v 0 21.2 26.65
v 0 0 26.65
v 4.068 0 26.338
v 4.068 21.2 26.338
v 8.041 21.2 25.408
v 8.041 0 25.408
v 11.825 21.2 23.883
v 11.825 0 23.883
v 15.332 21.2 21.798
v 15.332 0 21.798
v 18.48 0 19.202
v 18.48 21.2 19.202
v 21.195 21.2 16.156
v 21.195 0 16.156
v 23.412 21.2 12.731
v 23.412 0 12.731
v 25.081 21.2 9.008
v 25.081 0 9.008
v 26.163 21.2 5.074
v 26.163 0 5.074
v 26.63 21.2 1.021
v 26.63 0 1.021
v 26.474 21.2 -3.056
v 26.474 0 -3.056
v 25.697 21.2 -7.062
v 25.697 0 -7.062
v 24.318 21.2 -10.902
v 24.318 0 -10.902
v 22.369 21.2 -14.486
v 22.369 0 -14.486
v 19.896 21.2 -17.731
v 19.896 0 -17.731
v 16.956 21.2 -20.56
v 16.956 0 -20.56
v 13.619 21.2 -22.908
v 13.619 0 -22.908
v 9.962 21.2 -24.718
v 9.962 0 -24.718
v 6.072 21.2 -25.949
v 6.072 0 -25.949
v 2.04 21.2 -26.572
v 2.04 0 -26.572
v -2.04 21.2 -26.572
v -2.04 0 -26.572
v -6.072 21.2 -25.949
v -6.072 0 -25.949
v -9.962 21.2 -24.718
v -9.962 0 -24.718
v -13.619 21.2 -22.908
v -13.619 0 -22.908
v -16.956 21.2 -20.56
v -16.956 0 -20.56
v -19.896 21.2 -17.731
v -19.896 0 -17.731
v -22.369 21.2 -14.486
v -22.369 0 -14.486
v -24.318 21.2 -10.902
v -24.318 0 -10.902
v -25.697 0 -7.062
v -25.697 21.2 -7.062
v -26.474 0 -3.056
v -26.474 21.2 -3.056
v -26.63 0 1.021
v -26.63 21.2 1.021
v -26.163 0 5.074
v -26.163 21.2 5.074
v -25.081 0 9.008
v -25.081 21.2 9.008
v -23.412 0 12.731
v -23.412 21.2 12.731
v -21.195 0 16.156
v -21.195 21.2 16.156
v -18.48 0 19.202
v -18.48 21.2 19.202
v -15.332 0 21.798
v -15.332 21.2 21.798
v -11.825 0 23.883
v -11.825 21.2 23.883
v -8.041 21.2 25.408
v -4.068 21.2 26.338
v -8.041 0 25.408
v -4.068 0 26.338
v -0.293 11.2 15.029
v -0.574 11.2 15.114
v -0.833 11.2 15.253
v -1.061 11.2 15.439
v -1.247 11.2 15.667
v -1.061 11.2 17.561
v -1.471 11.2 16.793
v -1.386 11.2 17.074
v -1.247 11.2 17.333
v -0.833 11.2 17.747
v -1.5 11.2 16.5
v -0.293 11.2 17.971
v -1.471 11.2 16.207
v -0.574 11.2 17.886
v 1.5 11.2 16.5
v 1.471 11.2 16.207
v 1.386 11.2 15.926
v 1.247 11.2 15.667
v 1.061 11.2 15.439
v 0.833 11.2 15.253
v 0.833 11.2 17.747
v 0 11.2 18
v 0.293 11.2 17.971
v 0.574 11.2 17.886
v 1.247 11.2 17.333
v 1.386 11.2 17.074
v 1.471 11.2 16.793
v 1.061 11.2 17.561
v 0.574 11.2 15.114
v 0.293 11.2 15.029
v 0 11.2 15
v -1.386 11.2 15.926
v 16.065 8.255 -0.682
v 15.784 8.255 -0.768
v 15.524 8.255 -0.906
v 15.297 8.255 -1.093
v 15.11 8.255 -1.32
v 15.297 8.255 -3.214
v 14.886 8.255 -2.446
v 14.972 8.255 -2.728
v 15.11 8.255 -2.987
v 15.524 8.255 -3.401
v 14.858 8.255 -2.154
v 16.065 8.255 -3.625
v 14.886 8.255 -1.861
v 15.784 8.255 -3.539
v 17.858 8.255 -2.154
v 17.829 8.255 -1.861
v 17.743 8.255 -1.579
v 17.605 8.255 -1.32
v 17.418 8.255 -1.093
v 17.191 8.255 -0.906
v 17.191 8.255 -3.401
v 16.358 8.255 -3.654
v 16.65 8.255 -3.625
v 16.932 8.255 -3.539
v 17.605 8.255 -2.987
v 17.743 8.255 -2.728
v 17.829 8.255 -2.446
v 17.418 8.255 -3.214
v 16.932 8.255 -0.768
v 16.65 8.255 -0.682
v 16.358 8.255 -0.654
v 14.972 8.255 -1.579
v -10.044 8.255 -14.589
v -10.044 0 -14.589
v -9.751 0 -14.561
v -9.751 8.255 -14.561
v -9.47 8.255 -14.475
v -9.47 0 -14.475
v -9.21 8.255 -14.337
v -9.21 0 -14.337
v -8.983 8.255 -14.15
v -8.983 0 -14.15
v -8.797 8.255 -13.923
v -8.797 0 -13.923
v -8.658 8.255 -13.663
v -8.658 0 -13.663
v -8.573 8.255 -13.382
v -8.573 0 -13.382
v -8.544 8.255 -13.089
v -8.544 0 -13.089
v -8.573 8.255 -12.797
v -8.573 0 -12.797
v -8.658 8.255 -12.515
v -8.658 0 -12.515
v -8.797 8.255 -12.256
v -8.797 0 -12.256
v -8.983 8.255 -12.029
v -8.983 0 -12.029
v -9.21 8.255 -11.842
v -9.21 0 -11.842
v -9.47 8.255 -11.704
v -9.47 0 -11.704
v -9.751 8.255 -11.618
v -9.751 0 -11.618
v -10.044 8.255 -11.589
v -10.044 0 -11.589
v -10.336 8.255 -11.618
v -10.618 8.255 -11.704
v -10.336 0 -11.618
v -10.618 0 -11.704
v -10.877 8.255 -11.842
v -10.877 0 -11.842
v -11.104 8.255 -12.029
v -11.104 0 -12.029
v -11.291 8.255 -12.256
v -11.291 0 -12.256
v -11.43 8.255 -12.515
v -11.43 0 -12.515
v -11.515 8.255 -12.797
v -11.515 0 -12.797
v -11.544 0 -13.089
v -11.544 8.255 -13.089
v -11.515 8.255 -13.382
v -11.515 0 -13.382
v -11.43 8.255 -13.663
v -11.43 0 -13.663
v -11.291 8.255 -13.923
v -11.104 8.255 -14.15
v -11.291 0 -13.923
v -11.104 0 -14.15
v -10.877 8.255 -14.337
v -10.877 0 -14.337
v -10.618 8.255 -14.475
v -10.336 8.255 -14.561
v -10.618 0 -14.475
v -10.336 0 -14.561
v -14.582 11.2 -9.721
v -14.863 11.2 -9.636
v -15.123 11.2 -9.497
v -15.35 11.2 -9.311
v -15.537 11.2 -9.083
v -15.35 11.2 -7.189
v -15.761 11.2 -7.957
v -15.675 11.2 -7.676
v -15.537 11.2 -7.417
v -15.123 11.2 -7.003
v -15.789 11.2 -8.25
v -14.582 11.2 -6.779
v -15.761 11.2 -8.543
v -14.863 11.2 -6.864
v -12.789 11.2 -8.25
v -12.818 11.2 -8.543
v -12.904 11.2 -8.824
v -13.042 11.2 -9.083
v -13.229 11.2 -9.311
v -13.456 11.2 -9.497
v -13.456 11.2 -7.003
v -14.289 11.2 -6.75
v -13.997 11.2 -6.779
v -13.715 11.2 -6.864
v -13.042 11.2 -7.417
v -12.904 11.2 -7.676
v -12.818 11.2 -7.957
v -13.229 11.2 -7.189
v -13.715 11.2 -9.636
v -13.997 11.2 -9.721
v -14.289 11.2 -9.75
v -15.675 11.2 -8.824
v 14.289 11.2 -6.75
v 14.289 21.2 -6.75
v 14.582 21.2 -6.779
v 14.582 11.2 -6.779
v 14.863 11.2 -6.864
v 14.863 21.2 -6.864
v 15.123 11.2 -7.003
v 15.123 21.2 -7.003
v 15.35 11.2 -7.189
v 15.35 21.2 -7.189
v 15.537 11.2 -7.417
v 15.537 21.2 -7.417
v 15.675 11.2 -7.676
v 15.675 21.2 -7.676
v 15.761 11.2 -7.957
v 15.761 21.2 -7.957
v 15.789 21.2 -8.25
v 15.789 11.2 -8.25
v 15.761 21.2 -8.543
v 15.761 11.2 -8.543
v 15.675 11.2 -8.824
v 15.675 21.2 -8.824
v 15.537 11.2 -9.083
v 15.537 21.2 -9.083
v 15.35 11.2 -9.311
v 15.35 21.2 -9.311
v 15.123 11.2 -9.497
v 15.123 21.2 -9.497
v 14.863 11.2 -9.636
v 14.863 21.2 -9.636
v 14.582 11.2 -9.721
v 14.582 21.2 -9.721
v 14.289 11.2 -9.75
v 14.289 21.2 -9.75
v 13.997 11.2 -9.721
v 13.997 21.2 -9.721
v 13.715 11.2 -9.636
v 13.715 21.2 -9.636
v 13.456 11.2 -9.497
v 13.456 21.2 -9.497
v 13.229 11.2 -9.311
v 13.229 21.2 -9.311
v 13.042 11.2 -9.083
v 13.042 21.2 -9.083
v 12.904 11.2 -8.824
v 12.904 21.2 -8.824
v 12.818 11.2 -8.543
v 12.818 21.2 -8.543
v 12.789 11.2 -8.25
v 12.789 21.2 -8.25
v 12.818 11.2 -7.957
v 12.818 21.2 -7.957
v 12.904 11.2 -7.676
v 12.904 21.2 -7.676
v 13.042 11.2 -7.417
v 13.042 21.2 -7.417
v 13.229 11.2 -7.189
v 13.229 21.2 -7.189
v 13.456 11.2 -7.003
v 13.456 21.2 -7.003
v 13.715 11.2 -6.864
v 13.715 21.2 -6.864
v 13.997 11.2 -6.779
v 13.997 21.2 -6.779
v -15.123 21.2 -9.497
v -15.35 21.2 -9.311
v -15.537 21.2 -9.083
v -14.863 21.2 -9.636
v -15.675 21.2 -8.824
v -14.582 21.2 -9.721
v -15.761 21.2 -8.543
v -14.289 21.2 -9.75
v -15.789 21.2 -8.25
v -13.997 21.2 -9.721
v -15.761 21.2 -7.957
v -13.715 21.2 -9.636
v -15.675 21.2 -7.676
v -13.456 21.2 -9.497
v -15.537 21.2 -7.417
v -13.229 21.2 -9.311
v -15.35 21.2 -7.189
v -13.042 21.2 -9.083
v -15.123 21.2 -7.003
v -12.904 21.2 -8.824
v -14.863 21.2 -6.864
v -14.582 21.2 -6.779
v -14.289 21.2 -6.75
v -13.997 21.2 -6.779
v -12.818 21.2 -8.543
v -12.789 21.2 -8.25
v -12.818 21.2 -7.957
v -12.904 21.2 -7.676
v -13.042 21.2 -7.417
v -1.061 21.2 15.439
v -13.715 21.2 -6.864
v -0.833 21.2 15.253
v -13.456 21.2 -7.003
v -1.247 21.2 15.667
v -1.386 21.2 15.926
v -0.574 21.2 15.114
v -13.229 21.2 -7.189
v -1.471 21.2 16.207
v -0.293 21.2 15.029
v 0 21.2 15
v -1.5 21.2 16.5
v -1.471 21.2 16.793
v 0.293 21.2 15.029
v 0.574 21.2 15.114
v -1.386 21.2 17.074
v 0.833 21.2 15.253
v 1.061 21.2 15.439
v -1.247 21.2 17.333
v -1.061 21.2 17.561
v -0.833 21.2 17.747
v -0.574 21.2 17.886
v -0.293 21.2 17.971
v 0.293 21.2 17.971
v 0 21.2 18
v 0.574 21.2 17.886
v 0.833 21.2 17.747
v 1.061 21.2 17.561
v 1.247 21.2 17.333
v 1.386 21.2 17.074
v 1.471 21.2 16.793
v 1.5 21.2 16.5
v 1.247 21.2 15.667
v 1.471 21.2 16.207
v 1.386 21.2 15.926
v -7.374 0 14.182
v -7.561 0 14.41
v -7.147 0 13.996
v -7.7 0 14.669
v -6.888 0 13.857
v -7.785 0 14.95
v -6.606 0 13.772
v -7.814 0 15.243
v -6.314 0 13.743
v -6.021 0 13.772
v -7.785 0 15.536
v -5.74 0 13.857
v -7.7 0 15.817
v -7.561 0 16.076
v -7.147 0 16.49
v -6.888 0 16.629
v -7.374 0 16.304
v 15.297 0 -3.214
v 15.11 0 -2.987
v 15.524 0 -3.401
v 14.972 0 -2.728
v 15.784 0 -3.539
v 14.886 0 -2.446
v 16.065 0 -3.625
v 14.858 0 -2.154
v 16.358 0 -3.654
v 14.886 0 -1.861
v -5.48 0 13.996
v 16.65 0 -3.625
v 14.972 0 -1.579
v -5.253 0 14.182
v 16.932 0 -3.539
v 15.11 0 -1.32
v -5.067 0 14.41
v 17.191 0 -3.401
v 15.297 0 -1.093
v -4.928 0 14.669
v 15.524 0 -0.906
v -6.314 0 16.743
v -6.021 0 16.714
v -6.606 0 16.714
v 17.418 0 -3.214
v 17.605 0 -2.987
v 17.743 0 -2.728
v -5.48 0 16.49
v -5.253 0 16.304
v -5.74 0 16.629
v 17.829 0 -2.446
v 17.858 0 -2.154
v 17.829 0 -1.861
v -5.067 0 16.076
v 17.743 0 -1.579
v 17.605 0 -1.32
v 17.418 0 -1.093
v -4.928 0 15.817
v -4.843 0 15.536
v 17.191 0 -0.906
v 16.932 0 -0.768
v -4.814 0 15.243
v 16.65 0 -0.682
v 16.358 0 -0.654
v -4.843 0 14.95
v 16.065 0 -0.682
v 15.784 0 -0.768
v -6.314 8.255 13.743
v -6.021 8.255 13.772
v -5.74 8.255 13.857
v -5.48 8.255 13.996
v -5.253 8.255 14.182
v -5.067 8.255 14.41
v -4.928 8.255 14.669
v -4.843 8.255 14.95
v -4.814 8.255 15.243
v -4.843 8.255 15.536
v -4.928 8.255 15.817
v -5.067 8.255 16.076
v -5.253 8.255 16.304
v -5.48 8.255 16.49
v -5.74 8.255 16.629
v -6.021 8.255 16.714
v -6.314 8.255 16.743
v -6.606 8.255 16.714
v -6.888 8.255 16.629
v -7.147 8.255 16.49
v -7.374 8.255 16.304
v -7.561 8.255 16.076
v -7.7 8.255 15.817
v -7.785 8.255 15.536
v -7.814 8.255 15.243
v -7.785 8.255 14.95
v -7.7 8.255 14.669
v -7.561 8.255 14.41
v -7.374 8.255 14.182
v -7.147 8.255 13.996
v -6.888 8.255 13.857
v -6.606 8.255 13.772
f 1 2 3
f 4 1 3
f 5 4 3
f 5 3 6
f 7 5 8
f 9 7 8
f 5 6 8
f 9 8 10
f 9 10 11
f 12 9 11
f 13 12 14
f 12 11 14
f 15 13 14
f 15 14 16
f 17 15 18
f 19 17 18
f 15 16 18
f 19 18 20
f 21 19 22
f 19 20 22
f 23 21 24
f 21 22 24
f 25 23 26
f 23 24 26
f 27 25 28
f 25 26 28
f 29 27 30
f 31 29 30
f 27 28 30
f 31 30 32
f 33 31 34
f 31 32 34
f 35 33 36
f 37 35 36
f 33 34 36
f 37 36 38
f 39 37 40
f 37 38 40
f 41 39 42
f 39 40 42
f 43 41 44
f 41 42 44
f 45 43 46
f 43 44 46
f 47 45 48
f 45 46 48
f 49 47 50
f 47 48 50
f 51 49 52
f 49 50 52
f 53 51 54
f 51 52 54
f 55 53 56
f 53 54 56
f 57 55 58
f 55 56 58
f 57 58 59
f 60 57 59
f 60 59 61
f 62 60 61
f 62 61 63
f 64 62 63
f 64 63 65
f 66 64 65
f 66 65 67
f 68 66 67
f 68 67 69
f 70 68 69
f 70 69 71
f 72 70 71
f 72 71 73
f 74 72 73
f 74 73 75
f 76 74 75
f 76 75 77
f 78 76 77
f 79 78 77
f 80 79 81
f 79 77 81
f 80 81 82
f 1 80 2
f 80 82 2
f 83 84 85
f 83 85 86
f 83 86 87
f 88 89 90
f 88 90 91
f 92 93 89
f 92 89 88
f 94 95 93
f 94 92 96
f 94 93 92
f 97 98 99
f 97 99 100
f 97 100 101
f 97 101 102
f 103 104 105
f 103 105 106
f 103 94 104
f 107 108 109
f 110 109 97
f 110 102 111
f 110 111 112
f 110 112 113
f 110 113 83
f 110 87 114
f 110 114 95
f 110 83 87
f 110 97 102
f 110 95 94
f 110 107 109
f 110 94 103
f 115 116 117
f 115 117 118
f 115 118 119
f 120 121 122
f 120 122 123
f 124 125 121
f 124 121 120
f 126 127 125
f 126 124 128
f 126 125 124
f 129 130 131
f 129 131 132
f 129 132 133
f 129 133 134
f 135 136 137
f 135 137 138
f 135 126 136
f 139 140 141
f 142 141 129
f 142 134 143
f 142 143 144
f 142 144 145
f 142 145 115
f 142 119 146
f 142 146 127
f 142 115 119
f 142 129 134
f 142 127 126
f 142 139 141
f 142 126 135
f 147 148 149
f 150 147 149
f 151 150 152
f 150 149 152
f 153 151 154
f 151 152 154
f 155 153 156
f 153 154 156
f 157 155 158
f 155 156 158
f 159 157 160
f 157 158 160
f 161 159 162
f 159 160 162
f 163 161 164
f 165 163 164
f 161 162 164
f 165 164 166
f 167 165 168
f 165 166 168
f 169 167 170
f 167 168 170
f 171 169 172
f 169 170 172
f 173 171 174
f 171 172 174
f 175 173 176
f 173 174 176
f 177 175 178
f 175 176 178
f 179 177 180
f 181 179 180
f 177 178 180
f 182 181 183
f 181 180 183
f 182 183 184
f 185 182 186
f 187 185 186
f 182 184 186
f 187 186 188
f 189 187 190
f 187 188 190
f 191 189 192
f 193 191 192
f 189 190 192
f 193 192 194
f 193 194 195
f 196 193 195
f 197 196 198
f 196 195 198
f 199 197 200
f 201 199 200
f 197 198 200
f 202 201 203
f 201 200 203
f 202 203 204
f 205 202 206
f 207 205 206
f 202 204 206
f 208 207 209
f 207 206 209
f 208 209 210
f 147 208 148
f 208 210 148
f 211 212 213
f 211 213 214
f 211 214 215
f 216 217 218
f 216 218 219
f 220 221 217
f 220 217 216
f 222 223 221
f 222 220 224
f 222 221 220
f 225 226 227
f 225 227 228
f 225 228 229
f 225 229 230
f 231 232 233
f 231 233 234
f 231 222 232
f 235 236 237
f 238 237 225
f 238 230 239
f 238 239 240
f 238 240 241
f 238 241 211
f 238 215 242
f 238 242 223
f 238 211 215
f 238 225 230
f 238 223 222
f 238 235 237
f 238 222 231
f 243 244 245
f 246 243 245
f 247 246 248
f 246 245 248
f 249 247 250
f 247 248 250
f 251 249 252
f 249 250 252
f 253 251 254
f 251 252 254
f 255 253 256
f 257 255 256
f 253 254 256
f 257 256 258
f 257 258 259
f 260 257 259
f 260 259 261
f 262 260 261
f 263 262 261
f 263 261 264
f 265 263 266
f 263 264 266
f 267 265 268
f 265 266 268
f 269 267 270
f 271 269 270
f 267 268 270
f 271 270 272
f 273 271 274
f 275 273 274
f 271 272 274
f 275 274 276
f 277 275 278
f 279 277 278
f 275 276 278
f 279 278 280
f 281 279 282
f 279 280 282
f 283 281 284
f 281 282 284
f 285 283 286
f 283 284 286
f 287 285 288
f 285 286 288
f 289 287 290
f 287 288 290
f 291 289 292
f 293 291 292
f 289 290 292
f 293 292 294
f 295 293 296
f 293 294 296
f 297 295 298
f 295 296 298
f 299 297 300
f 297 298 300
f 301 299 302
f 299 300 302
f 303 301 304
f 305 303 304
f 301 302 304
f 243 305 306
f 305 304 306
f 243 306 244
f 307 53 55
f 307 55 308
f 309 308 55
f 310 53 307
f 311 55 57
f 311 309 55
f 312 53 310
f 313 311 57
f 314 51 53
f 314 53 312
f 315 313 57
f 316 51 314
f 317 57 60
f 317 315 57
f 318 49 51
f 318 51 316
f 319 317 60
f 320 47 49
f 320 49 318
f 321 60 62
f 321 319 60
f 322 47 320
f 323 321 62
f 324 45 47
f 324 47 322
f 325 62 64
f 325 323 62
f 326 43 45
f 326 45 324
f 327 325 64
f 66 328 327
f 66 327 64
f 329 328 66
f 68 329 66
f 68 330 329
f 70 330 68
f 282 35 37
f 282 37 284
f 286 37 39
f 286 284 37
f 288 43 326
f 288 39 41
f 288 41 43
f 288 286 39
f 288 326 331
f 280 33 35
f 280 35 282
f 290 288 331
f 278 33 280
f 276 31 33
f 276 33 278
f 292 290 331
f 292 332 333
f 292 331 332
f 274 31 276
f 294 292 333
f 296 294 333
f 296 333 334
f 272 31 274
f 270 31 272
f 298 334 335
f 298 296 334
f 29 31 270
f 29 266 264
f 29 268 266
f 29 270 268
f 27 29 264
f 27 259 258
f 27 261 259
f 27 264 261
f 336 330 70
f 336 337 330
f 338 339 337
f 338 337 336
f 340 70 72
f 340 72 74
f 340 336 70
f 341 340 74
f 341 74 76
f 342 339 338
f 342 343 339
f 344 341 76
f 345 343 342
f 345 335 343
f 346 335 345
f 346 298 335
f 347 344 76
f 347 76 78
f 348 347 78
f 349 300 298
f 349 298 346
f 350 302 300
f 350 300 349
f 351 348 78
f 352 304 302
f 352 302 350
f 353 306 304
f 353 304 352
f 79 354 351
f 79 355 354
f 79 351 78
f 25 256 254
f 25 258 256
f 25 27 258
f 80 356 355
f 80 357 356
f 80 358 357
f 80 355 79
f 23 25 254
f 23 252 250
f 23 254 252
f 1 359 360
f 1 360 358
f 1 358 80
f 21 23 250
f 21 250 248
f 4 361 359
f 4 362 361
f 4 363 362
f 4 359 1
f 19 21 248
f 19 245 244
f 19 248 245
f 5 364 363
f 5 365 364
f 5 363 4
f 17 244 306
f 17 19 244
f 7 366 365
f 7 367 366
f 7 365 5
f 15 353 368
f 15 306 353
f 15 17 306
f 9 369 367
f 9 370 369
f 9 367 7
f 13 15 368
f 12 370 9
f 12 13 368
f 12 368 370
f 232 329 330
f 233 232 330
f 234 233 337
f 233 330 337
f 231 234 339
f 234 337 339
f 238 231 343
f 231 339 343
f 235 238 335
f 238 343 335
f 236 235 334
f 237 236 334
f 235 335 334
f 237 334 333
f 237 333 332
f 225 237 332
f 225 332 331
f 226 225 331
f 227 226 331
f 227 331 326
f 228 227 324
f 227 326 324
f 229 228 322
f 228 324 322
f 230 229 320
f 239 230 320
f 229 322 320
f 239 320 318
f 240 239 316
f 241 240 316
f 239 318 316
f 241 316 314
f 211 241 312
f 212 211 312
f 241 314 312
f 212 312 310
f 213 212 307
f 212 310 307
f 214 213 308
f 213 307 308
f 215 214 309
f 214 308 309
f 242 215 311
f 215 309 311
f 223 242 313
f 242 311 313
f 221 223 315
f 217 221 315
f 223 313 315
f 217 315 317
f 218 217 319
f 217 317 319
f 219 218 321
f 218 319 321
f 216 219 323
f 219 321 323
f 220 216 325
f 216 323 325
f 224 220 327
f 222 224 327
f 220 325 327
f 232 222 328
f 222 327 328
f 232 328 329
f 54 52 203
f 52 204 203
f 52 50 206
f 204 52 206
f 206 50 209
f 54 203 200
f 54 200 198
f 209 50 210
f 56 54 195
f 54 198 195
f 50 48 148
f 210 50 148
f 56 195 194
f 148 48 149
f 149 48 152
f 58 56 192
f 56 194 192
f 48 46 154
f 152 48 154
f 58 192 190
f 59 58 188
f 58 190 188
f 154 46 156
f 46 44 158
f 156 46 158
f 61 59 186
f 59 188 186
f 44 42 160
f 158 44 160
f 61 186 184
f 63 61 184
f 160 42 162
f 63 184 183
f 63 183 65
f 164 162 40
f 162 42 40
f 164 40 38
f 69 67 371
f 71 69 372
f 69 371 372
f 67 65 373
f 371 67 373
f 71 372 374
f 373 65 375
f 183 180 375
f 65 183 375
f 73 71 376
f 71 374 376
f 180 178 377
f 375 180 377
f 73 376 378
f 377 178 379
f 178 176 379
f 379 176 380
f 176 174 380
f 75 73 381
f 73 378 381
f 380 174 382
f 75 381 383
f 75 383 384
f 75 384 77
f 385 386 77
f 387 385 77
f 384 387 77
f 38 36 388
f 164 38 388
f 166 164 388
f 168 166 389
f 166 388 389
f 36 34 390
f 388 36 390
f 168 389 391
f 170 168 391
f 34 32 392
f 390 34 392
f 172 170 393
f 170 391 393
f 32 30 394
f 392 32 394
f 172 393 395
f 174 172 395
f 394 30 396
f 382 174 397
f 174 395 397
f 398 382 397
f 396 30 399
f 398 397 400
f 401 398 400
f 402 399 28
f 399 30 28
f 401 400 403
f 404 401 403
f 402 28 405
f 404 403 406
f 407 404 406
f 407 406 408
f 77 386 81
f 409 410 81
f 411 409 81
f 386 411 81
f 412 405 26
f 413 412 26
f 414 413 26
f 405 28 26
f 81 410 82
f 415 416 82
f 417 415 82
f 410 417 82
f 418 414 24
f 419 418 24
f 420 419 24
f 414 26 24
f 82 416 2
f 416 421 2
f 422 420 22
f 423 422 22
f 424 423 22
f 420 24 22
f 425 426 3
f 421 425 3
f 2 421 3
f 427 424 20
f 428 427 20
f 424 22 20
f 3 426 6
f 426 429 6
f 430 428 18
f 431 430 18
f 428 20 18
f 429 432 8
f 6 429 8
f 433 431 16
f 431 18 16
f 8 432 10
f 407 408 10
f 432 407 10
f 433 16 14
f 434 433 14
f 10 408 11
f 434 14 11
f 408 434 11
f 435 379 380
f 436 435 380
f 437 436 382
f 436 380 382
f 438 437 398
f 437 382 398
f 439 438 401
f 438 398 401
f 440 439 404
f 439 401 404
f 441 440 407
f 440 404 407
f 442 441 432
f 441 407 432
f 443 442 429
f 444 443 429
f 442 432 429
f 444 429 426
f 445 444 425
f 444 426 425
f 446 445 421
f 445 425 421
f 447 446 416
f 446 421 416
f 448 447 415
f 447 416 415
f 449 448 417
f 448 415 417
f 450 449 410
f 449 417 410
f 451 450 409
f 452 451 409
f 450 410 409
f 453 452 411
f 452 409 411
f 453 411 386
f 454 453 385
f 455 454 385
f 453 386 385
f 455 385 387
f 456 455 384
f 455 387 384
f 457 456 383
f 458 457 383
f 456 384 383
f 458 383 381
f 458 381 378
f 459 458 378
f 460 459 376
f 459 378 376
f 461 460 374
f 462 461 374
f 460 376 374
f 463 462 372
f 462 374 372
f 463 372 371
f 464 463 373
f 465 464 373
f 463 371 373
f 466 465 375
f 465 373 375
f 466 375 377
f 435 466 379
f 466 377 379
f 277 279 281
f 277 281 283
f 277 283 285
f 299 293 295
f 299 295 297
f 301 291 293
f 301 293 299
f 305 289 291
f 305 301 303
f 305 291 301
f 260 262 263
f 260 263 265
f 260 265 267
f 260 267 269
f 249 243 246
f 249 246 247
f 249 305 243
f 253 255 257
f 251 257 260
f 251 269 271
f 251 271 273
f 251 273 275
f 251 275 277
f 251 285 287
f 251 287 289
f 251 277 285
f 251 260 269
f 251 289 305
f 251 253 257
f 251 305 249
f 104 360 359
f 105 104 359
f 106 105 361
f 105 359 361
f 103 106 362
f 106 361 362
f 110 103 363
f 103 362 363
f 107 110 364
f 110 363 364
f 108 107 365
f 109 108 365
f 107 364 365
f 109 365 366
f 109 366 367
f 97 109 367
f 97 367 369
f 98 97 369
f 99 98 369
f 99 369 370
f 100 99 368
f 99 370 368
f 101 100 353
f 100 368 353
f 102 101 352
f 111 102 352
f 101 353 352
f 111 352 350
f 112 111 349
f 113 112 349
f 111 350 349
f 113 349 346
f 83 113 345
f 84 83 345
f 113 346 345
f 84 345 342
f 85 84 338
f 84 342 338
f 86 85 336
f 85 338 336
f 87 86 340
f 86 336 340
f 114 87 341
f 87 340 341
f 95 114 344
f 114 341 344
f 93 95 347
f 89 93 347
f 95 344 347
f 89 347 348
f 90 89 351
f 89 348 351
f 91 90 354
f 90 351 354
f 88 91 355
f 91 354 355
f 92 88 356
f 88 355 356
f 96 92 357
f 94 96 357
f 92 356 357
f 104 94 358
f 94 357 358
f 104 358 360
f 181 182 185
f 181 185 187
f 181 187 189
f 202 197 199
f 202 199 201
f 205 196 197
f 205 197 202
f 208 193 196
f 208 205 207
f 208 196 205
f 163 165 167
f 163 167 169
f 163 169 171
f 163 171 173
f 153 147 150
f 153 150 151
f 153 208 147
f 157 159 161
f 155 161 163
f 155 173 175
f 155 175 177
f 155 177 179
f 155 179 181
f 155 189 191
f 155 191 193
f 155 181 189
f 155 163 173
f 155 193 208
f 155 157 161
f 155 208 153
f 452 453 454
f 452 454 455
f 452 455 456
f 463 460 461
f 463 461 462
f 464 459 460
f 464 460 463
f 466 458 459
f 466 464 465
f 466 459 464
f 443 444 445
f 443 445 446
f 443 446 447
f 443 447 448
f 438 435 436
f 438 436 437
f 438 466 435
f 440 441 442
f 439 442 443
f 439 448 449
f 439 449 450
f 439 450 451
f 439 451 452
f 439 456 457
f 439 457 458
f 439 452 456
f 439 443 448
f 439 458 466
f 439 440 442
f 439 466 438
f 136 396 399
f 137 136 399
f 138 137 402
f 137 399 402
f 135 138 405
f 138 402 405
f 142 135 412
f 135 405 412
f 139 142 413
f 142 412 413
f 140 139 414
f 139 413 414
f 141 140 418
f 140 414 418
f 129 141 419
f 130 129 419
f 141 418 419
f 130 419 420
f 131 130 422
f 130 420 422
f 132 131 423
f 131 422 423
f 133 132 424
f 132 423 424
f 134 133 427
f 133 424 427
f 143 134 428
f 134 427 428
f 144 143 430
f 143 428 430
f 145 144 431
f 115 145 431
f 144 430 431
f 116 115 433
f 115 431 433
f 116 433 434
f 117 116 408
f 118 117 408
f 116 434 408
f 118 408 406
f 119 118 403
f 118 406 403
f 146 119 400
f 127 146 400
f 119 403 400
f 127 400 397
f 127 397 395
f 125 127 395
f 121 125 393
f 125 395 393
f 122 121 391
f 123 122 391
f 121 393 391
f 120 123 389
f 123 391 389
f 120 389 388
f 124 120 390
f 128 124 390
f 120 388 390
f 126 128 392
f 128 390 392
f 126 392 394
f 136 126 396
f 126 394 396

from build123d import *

# Parameters (mm, degrees)
SKETCH1_R           = 26.65
BOSS_EXTRUDE1_DEPTH = 21.2
SKETCH6_R           = 1.5
CUT_EXTRUDE2_DEPTH  = 8.255
SKETCH7_R           = 1.5
CUT_EXTRUDE3_DEPTH  = 10


with BuildPart() as part:
    # Sketch1 → Boss-Extrude1 (new body)
    with BuildSketch(Plane(origin=(0, 0, 0), x_dir=(1, 0, 0), z_dir=(0, 1, 0))):
        with Locations(Location((0, 0, 0), (0, 0, 270))):
            Circle(SKETCH1_R)
    extrude(amount=BOSS_EXTRUDE1_DEPTH)

    # Sketch6 → Cut-Extrude2 (cut)
    with BuildSketch(Plane(origin=(0, 0, 0), x_dir=(-1, 0, 0), z_dir=(0, -1, 0))):
        with Locations(Location((6.313805851, -15.242875716, 0), (0, 0, 90))):
            Circle(SKETCH6_R)
        with Locations(Location((-16.357620523, 2.153521596, 0), (0, 0, 90))):
            Circle(SKETCH6_R)
        with Locations(Location((10.043814672, 13.08935412, 0), (0, 0, 90))):
            Circle(SKETCH6_R)
    extrude(amount=-CUT_EXTRUDE2_DEPTH, mode=Mode.SUBTRACT)

    # Sketch7 → Cut-Extrude3 (cut)
    with BuildSketch(Plane(origin=(0, 21.2, 0), x_dir=(1, 0, 0), z_dir=(0, 1, 0))):
        with Locations(Location((0, -16.5, 0), (0, 0, 270))):
            Circle(SKETCH7_R)
        with Locations(Location((-14.289419162, 8.25, 0), (0, 0, 270))):
            Circle(SKETCH7_R)
        with Locations(Location((14.289419162, 8.25, 0), (0, 0, 270))):
            Circle(SKETCH7_R)
    extrude(amount=-CUT_EXTRUDE3_DEPTH, mode=Mode.SUBTRACT)


solid = part.part
